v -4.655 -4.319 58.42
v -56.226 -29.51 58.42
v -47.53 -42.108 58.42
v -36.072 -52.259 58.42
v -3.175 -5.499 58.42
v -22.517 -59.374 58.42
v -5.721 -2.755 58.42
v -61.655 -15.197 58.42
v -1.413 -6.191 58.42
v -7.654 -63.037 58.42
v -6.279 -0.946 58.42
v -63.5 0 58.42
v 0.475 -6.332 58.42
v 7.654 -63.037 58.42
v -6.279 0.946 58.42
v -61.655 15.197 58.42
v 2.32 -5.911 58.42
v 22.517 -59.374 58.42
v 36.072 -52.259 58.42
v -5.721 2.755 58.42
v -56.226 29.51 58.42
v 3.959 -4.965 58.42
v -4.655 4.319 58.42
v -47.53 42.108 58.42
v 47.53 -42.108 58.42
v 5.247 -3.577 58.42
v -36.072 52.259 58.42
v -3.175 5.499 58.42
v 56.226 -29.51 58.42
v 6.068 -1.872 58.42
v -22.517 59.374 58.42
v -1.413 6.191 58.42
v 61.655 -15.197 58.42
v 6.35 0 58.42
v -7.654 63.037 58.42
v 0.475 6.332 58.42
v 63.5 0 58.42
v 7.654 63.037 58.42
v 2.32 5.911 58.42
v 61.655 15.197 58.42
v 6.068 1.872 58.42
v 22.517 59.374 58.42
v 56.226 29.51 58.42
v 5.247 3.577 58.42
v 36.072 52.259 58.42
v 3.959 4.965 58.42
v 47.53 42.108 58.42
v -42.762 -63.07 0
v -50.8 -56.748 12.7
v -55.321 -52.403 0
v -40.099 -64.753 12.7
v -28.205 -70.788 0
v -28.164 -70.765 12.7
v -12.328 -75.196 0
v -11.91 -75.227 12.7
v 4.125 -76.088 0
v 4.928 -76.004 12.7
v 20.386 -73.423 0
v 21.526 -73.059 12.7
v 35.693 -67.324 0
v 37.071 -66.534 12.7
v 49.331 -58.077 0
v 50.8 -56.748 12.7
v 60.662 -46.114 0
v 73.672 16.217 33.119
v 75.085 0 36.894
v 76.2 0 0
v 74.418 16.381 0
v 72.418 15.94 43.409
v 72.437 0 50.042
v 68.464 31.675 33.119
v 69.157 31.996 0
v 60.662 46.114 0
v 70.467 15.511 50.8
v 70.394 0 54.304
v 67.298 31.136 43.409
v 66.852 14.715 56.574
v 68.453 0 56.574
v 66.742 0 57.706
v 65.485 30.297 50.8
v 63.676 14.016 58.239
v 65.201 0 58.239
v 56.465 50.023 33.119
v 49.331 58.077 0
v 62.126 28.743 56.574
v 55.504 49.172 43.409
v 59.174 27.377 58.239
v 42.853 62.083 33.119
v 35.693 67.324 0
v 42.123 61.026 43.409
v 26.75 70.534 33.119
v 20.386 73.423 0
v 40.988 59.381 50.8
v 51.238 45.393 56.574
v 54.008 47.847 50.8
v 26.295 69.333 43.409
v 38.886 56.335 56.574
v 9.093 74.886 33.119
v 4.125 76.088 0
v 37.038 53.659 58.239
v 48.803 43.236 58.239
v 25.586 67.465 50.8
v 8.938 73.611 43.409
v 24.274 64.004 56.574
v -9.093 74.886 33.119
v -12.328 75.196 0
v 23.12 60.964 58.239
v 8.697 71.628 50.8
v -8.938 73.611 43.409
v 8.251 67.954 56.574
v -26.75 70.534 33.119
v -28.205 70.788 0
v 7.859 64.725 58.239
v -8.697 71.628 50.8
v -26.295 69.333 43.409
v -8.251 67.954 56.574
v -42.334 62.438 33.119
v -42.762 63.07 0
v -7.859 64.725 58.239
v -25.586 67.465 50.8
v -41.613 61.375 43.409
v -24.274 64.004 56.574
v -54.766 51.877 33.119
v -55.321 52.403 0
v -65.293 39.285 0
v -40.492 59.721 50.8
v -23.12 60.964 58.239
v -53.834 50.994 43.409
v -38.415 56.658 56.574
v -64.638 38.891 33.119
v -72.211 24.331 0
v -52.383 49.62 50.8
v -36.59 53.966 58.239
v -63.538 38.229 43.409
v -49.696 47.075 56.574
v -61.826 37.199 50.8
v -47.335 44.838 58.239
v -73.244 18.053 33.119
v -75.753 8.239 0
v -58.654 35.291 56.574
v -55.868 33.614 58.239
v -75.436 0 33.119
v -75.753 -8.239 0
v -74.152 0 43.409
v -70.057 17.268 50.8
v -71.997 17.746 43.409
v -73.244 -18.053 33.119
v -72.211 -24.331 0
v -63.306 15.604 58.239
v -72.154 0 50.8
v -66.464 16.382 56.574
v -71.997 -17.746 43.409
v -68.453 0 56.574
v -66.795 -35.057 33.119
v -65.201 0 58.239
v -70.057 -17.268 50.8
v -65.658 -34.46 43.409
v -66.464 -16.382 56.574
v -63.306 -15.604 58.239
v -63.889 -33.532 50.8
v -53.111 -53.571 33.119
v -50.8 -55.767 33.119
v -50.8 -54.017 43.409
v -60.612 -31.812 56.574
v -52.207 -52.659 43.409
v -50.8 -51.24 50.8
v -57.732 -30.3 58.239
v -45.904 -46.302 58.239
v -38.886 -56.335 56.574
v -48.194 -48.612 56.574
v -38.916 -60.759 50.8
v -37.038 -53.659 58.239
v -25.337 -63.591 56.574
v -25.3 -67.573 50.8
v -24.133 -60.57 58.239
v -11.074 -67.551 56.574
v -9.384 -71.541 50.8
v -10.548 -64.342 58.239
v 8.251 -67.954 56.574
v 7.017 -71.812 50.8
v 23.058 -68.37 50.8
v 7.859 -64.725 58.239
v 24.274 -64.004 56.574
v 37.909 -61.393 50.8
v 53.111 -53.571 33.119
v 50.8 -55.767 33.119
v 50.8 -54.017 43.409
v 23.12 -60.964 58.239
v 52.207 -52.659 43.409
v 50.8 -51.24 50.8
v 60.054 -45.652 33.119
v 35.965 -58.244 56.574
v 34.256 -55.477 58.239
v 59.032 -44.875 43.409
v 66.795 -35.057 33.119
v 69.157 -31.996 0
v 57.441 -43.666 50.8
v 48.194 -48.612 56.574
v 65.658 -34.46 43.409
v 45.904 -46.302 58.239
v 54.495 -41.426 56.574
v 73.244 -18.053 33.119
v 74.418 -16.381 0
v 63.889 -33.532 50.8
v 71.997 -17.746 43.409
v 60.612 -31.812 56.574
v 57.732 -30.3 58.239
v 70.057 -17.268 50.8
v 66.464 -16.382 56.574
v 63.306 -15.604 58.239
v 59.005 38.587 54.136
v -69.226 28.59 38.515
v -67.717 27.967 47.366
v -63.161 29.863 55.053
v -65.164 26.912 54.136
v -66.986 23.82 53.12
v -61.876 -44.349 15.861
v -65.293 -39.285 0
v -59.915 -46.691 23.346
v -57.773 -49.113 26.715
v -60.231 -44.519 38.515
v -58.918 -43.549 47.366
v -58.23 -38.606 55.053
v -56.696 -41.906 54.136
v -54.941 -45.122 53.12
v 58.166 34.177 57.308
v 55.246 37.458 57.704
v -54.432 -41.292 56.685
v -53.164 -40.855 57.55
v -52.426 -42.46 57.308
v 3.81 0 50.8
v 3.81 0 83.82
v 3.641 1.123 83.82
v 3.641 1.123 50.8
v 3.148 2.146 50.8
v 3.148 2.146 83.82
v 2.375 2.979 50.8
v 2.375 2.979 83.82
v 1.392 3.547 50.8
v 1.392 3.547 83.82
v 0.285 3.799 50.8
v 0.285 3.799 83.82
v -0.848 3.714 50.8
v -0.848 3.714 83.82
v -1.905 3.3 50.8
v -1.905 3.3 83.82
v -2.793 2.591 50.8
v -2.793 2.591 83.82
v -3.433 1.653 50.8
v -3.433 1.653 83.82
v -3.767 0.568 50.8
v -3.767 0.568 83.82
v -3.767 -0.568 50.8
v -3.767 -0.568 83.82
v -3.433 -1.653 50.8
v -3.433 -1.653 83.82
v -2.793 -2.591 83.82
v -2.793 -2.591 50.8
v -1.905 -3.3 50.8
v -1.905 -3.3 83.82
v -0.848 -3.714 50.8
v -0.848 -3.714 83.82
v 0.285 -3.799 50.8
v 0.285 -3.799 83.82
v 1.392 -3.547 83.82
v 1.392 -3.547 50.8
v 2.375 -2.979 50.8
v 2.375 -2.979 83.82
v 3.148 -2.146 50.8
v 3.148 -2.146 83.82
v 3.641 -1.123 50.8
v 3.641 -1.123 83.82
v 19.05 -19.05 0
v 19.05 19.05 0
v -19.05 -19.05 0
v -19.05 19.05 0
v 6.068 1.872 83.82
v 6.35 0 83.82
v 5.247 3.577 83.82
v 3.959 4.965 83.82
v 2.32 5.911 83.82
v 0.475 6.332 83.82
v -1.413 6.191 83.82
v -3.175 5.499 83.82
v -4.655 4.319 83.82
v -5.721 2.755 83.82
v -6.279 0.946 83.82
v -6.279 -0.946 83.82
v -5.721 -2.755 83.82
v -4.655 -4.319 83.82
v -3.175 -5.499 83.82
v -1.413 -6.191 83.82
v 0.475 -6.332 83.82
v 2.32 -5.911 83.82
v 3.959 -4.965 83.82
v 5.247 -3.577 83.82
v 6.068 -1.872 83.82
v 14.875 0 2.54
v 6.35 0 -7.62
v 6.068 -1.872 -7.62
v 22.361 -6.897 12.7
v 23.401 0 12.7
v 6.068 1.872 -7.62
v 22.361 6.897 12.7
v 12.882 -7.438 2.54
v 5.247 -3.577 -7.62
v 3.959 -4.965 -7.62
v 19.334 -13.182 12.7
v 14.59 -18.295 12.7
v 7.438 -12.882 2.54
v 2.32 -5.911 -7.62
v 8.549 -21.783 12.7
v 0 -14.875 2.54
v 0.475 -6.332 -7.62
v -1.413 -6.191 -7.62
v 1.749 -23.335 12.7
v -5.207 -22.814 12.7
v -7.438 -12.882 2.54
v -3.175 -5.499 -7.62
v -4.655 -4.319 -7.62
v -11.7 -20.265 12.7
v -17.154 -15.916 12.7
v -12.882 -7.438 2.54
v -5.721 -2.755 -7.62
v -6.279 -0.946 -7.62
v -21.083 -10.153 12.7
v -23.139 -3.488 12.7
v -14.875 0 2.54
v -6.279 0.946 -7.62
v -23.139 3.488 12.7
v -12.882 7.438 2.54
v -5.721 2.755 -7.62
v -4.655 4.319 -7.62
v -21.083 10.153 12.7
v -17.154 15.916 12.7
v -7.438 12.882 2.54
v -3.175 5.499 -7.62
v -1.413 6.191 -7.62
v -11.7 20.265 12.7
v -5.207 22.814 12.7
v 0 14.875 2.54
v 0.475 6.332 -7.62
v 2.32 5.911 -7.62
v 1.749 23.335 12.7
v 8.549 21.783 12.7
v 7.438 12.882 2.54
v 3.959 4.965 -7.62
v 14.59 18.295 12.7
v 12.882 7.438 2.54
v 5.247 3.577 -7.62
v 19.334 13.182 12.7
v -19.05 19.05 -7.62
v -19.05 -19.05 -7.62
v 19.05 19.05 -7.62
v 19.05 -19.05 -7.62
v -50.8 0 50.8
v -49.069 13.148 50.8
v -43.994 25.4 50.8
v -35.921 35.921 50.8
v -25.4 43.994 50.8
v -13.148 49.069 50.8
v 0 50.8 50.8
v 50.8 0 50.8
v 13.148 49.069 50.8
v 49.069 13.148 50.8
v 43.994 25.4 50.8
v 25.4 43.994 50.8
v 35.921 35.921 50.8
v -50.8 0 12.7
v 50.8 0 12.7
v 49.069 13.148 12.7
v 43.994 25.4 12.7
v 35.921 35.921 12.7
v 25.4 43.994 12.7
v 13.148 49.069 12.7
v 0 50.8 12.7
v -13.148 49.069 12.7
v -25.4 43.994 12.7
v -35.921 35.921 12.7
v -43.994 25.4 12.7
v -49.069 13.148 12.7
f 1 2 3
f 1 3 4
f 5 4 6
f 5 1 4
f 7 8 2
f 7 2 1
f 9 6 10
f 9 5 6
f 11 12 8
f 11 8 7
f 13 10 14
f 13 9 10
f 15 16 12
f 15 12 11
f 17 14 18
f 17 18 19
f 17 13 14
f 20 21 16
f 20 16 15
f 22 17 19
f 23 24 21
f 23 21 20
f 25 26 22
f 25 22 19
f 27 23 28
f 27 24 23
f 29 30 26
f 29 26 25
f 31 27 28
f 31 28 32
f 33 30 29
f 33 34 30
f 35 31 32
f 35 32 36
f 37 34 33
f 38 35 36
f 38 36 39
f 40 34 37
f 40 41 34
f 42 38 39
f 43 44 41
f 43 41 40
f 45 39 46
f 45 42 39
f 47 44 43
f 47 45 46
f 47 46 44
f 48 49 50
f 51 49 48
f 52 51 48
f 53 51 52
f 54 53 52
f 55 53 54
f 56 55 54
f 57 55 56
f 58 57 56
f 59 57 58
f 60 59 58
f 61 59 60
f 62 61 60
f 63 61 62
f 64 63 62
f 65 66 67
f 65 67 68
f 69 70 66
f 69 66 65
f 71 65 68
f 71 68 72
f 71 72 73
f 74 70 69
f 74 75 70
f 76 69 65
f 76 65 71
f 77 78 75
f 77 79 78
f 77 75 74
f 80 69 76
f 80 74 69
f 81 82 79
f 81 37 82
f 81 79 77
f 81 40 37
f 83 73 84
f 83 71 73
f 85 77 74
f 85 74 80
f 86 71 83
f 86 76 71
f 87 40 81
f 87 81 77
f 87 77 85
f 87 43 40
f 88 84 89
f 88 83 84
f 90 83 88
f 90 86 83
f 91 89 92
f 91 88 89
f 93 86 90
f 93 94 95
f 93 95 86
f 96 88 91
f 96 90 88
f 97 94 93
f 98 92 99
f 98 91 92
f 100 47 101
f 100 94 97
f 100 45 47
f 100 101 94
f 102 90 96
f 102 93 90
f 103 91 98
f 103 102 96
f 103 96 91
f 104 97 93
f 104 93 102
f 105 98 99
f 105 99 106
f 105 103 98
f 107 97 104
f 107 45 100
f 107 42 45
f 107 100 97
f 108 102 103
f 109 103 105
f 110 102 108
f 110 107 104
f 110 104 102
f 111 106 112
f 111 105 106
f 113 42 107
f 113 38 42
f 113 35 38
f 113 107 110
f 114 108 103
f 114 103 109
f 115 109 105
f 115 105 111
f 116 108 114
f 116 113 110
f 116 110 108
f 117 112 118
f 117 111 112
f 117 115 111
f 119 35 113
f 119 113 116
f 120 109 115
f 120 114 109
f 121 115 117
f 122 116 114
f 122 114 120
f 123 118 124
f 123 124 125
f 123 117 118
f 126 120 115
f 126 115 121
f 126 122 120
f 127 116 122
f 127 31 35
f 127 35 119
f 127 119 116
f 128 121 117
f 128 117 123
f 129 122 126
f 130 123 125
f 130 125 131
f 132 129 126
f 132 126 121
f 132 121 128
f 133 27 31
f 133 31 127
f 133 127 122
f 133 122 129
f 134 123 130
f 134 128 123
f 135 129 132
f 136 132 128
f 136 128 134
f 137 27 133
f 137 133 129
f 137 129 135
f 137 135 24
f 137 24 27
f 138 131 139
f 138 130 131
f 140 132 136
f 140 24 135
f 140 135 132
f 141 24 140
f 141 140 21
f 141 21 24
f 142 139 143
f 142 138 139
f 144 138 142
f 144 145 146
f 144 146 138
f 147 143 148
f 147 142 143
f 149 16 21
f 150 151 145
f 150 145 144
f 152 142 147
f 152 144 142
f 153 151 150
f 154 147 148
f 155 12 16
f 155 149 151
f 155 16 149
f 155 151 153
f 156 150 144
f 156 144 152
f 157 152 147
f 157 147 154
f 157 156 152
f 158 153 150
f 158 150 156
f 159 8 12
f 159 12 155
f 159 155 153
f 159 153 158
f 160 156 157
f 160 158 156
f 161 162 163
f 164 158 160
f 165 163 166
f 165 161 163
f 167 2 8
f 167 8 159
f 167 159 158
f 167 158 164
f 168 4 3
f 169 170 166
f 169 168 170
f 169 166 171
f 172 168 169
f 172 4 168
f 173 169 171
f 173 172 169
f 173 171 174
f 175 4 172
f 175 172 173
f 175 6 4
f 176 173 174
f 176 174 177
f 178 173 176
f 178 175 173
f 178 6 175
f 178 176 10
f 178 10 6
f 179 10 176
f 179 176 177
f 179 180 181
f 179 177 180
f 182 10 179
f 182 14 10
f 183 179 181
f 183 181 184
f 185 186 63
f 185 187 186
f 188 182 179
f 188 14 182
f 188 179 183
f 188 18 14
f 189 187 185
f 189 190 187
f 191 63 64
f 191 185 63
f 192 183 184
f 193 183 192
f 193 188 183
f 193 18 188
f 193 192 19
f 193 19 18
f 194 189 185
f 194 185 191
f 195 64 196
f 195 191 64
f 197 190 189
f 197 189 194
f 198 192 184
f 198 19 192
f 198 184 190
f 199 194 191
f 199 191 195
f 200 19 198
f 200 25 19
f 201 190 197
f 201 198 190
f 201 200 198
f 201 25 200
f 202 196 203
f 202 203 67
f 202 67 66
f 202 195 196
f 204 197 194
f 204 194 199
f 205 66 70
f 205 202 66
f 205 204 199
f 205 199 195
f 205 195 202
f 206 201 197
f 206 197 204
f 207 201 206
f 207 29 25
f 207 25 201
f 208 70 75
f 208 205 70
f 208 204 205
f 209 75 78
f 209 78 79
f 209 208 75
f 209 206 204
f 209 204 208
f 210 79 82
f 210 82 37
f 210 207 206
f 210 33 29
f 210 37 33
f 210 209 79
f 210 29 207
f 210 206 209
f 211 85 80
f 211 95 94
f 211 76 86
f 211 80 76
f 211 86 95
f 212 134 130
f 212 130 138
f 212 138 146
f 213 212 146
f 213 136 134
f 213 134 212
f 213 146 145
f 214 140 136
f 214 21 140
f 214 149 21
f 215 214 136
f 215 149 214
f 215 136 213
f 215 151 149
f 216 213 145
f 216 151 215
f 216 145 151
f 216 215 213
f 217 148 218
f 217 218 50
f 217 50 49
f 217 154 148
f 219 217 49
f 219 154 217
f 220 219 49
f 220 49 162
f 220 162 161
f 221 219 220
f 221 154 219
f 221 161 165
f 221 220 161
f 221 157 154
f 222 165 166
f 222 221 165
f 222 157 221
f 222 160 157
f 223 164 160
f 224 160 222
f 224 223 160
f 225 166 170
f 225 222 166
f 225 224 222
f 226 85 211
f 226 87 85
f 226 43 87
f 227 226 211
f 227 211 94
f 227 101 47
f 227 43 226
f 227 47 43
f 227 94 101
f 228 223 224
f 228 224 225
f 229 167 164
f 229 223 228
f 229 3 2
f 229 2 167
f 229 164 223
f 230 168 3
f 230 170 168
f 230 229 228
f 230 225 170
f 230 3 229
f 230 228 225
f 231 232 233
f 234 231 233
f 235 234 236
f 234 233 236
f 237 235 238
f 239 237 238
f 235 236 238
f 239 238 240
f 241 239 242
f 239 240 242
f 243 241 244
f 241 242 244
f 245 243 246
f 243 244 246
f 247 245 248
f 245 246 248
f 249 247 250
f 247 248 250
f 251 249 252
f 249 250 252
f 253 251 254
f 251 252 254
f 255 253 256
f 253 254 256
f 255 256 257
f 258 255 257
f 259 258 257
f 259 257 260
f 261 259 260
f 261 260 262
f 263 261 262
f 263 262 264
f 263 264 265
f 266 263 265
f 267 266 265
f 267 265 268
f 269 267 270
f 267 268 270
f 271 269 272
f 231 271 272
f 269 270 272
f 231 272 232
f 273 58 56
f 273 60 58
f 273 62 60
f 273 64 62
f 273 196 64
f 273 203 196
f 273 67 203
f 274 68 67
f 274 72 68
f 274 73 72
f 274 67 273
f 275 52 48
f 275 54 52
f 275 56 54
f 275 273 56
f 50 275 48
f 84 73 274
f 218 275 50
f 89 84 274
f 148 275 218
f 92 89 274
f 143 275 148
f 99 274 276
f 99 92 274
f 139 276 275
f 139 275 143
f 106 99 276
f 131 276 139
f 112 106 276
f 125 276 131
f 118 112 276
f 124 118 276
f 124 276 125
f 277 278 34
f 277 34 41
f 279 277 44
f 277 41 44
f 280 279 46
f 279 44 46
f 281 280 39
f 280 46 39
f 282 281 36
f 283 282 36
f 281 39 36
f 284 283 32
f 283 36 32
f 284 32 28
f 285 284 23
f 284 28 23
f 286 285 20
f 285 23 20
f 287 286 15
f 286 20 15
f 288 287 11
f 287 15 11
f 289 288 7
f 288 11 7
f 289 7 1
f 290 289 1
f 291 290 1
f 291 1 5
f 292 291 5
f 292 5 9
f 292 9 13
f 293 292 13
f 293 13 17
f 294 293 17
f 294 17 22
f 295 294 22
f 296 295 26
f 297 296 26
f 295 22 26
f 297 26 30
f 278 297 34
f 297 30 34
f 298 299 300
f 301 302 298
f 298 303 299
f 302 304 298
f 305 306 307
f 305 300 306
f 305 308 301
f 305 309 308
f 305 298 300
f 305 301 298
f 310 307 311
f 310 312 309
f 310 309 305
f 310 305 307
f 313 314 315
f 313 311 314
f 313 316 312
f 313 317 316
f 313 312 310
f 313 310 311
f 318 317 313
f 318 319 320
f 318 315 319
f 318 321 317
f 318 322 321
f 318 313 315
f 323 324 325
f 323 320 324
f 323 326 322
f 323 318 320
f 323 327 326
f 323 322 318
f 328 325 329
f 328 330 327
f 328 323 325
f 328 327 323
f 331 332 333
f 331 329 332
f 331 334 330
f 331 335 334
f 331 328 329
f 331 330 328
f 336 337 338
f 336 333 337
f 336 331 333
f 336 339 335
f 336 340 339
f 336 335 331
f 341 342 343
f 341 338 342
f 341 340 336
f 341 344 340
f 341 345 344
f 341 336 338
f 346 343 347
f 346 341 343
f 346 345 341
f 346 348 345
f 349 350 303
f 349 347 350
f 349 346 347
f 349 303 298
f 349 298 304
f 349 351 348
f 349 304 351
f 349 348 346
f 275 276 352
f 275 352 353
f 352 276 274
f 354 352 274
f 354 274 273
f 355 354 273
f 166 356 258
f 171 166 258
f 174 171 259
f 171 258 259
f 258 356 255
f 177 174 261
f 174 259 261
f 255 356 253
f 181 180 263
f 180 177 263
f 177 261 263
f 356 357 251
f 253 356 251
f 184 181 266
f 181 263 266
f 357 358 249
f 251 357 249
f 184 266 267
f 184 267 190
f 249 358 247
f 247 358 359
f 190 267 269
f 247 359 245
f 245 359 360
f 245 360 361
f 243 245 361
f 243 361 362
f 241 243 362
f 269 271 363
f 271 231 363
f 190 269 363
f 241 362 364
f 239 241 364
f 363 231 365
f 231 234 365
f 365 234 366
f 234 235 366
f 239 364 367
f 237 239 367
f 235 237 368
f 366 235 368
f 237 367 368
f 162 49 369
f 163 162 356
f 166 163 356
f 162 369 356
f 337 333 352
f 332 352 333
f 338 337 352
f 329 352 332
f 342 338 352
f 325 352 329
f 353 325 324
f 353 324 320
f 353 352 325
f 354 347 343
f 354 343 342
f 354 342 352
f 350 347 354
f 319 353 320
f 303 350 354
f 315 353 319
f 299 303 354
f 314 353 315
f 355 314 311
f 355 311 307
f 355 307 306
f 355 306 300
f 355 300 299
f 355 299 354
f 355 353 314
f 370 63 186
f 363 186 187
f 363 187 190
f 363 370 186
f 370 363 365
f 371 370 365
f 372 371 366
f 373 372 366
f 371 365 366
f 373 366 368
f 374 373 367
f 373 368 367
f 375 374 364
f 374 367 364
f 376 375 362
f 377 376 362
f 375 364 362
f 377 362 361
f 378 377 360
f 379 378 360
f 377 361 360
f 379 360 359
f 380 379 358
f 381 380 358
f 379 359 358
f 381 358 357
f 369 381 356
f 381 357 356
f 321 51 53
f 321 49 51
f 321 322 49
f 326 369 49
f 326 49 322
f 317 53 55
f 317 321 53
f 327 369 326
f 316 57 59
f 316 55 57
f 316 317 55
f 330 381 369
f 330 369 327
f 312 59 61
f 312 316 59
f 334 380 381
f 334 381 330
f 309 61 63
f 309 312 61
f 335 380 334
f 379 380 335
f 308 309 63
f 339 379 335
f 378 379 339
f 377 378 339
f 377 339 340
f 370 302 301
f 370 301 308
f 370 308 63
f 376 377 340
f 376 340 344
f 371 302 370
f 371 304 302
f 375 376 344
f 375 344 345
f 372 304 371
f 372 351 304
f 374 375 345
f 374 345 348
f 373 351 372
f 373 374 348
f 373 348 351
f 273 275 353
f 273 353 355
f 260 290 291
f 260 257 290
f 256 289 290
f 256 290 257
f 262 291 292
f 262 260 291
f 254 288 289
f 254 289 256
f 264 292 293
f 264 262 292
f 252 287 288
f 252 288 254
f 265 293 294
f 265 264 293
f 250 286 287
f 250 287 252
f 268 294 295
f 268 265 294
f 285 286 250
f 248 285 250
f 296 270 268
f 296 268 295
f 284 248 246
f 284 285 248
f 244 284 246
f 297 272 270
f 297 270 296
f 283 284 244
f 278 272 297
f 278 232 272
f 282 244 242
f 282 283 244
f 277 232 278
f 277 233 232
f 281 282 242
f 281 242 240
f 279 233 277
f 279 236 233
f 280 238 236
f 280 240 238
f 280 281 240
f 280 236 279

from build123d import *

# Parameters (mm, degrees)
F2_W      = 50.8
F2_H      = 38.1
F4_W      = 101.6
F4_H      = 38.1
F5_DEPTH  = 76.2010001
F6_W      = 38.1
F6_H      = 38.1
F7_DEPTH  = 7.62
F8_R      = 6.35
F9_DEPTH  = 20.32
F9_TAPER  = -40
F10_R     = 6.35
F11_DEPTH = 25.4
F12_R     = 3.81
F13_DEPTH = 33.02


with BuildPart() as f1:
    # F0 (on Front) → F1 (revolve)
    with BuildSketch(Plane.XZ):
        with BuildLine():
            Line((0, 0), (76.2, 0))
            add(Edge.make_bspline(
                [(76.2, 0), (76.2, 30.4536055773), (76.2, 58.42), (63.5, 58.42)],
                knots=[0, 0, 0, 0, 59.7844996634, 59.7844996634, 59.7844996634, 59.7844996634], degree=3))
            Line((63.5, 58.42), (0, 58.42))
            Line((0, 58.42), (0, 0))
        make_face()
    revolve(axis=Axis((0, 0, 29.21), (0, 0, 1)))

    # F2 (on Front) → F3 (revolve, cut)
    with BuildSketch(Plane.XZ):
        with Locations((25.4, 31.75)):
            Rectangle(F2_W, F2_H)
    revolve(axis=Axis((0, 0, 31.75), (0, 0, 1)), mode=Mode.SUBTRACT)

    # F4 (on Front) → F5 (cut, through all)
    with BuildSketch(Plane.XZ):
        with Locations((0, 31.75)):
            Rectangle(F4_W, F4_H)
    extrude(amount=F5_DEPTH, mode=Mode.SUBTRACT)

    # F6 (on face) → F7 (join)
    with BuildSketch(Plane(origin=(0, 0, 0), x_dir=(1, 0, 0), z_dir=(0, 0, -1))):
        Rectangle(F6_W, F6_H)
    extrude(amount=F7_DEPTH)

    # F8 (on face) → F9 (cut, through all)
    with BuildSketch(Plane(origin=(0, 0, -7.62), x_dir=(1, 0, 0), z_dir=(0, 0, -1))):
        Circle(F8_R)
    extrude(amount=-F9_DEPTH, taper=F9_TAPER, mode=Mode.SUBTRACT)

    # F10 (on face) → F11 (join)
    with BuildSketch(Plane.XY.offset(58.42)):
        Circle(F10_R)
    extrude(amount=F11_DEPTH)

    # F12 (on face) → F13 (cut, through all)
    with BuildSketch(Plane.XY.offset(83.82)):
        Circle(F12_R)
    extrude(amount=-F13_DEPTH, mode=Mode.SUBTRACT)


solid = f1.part
